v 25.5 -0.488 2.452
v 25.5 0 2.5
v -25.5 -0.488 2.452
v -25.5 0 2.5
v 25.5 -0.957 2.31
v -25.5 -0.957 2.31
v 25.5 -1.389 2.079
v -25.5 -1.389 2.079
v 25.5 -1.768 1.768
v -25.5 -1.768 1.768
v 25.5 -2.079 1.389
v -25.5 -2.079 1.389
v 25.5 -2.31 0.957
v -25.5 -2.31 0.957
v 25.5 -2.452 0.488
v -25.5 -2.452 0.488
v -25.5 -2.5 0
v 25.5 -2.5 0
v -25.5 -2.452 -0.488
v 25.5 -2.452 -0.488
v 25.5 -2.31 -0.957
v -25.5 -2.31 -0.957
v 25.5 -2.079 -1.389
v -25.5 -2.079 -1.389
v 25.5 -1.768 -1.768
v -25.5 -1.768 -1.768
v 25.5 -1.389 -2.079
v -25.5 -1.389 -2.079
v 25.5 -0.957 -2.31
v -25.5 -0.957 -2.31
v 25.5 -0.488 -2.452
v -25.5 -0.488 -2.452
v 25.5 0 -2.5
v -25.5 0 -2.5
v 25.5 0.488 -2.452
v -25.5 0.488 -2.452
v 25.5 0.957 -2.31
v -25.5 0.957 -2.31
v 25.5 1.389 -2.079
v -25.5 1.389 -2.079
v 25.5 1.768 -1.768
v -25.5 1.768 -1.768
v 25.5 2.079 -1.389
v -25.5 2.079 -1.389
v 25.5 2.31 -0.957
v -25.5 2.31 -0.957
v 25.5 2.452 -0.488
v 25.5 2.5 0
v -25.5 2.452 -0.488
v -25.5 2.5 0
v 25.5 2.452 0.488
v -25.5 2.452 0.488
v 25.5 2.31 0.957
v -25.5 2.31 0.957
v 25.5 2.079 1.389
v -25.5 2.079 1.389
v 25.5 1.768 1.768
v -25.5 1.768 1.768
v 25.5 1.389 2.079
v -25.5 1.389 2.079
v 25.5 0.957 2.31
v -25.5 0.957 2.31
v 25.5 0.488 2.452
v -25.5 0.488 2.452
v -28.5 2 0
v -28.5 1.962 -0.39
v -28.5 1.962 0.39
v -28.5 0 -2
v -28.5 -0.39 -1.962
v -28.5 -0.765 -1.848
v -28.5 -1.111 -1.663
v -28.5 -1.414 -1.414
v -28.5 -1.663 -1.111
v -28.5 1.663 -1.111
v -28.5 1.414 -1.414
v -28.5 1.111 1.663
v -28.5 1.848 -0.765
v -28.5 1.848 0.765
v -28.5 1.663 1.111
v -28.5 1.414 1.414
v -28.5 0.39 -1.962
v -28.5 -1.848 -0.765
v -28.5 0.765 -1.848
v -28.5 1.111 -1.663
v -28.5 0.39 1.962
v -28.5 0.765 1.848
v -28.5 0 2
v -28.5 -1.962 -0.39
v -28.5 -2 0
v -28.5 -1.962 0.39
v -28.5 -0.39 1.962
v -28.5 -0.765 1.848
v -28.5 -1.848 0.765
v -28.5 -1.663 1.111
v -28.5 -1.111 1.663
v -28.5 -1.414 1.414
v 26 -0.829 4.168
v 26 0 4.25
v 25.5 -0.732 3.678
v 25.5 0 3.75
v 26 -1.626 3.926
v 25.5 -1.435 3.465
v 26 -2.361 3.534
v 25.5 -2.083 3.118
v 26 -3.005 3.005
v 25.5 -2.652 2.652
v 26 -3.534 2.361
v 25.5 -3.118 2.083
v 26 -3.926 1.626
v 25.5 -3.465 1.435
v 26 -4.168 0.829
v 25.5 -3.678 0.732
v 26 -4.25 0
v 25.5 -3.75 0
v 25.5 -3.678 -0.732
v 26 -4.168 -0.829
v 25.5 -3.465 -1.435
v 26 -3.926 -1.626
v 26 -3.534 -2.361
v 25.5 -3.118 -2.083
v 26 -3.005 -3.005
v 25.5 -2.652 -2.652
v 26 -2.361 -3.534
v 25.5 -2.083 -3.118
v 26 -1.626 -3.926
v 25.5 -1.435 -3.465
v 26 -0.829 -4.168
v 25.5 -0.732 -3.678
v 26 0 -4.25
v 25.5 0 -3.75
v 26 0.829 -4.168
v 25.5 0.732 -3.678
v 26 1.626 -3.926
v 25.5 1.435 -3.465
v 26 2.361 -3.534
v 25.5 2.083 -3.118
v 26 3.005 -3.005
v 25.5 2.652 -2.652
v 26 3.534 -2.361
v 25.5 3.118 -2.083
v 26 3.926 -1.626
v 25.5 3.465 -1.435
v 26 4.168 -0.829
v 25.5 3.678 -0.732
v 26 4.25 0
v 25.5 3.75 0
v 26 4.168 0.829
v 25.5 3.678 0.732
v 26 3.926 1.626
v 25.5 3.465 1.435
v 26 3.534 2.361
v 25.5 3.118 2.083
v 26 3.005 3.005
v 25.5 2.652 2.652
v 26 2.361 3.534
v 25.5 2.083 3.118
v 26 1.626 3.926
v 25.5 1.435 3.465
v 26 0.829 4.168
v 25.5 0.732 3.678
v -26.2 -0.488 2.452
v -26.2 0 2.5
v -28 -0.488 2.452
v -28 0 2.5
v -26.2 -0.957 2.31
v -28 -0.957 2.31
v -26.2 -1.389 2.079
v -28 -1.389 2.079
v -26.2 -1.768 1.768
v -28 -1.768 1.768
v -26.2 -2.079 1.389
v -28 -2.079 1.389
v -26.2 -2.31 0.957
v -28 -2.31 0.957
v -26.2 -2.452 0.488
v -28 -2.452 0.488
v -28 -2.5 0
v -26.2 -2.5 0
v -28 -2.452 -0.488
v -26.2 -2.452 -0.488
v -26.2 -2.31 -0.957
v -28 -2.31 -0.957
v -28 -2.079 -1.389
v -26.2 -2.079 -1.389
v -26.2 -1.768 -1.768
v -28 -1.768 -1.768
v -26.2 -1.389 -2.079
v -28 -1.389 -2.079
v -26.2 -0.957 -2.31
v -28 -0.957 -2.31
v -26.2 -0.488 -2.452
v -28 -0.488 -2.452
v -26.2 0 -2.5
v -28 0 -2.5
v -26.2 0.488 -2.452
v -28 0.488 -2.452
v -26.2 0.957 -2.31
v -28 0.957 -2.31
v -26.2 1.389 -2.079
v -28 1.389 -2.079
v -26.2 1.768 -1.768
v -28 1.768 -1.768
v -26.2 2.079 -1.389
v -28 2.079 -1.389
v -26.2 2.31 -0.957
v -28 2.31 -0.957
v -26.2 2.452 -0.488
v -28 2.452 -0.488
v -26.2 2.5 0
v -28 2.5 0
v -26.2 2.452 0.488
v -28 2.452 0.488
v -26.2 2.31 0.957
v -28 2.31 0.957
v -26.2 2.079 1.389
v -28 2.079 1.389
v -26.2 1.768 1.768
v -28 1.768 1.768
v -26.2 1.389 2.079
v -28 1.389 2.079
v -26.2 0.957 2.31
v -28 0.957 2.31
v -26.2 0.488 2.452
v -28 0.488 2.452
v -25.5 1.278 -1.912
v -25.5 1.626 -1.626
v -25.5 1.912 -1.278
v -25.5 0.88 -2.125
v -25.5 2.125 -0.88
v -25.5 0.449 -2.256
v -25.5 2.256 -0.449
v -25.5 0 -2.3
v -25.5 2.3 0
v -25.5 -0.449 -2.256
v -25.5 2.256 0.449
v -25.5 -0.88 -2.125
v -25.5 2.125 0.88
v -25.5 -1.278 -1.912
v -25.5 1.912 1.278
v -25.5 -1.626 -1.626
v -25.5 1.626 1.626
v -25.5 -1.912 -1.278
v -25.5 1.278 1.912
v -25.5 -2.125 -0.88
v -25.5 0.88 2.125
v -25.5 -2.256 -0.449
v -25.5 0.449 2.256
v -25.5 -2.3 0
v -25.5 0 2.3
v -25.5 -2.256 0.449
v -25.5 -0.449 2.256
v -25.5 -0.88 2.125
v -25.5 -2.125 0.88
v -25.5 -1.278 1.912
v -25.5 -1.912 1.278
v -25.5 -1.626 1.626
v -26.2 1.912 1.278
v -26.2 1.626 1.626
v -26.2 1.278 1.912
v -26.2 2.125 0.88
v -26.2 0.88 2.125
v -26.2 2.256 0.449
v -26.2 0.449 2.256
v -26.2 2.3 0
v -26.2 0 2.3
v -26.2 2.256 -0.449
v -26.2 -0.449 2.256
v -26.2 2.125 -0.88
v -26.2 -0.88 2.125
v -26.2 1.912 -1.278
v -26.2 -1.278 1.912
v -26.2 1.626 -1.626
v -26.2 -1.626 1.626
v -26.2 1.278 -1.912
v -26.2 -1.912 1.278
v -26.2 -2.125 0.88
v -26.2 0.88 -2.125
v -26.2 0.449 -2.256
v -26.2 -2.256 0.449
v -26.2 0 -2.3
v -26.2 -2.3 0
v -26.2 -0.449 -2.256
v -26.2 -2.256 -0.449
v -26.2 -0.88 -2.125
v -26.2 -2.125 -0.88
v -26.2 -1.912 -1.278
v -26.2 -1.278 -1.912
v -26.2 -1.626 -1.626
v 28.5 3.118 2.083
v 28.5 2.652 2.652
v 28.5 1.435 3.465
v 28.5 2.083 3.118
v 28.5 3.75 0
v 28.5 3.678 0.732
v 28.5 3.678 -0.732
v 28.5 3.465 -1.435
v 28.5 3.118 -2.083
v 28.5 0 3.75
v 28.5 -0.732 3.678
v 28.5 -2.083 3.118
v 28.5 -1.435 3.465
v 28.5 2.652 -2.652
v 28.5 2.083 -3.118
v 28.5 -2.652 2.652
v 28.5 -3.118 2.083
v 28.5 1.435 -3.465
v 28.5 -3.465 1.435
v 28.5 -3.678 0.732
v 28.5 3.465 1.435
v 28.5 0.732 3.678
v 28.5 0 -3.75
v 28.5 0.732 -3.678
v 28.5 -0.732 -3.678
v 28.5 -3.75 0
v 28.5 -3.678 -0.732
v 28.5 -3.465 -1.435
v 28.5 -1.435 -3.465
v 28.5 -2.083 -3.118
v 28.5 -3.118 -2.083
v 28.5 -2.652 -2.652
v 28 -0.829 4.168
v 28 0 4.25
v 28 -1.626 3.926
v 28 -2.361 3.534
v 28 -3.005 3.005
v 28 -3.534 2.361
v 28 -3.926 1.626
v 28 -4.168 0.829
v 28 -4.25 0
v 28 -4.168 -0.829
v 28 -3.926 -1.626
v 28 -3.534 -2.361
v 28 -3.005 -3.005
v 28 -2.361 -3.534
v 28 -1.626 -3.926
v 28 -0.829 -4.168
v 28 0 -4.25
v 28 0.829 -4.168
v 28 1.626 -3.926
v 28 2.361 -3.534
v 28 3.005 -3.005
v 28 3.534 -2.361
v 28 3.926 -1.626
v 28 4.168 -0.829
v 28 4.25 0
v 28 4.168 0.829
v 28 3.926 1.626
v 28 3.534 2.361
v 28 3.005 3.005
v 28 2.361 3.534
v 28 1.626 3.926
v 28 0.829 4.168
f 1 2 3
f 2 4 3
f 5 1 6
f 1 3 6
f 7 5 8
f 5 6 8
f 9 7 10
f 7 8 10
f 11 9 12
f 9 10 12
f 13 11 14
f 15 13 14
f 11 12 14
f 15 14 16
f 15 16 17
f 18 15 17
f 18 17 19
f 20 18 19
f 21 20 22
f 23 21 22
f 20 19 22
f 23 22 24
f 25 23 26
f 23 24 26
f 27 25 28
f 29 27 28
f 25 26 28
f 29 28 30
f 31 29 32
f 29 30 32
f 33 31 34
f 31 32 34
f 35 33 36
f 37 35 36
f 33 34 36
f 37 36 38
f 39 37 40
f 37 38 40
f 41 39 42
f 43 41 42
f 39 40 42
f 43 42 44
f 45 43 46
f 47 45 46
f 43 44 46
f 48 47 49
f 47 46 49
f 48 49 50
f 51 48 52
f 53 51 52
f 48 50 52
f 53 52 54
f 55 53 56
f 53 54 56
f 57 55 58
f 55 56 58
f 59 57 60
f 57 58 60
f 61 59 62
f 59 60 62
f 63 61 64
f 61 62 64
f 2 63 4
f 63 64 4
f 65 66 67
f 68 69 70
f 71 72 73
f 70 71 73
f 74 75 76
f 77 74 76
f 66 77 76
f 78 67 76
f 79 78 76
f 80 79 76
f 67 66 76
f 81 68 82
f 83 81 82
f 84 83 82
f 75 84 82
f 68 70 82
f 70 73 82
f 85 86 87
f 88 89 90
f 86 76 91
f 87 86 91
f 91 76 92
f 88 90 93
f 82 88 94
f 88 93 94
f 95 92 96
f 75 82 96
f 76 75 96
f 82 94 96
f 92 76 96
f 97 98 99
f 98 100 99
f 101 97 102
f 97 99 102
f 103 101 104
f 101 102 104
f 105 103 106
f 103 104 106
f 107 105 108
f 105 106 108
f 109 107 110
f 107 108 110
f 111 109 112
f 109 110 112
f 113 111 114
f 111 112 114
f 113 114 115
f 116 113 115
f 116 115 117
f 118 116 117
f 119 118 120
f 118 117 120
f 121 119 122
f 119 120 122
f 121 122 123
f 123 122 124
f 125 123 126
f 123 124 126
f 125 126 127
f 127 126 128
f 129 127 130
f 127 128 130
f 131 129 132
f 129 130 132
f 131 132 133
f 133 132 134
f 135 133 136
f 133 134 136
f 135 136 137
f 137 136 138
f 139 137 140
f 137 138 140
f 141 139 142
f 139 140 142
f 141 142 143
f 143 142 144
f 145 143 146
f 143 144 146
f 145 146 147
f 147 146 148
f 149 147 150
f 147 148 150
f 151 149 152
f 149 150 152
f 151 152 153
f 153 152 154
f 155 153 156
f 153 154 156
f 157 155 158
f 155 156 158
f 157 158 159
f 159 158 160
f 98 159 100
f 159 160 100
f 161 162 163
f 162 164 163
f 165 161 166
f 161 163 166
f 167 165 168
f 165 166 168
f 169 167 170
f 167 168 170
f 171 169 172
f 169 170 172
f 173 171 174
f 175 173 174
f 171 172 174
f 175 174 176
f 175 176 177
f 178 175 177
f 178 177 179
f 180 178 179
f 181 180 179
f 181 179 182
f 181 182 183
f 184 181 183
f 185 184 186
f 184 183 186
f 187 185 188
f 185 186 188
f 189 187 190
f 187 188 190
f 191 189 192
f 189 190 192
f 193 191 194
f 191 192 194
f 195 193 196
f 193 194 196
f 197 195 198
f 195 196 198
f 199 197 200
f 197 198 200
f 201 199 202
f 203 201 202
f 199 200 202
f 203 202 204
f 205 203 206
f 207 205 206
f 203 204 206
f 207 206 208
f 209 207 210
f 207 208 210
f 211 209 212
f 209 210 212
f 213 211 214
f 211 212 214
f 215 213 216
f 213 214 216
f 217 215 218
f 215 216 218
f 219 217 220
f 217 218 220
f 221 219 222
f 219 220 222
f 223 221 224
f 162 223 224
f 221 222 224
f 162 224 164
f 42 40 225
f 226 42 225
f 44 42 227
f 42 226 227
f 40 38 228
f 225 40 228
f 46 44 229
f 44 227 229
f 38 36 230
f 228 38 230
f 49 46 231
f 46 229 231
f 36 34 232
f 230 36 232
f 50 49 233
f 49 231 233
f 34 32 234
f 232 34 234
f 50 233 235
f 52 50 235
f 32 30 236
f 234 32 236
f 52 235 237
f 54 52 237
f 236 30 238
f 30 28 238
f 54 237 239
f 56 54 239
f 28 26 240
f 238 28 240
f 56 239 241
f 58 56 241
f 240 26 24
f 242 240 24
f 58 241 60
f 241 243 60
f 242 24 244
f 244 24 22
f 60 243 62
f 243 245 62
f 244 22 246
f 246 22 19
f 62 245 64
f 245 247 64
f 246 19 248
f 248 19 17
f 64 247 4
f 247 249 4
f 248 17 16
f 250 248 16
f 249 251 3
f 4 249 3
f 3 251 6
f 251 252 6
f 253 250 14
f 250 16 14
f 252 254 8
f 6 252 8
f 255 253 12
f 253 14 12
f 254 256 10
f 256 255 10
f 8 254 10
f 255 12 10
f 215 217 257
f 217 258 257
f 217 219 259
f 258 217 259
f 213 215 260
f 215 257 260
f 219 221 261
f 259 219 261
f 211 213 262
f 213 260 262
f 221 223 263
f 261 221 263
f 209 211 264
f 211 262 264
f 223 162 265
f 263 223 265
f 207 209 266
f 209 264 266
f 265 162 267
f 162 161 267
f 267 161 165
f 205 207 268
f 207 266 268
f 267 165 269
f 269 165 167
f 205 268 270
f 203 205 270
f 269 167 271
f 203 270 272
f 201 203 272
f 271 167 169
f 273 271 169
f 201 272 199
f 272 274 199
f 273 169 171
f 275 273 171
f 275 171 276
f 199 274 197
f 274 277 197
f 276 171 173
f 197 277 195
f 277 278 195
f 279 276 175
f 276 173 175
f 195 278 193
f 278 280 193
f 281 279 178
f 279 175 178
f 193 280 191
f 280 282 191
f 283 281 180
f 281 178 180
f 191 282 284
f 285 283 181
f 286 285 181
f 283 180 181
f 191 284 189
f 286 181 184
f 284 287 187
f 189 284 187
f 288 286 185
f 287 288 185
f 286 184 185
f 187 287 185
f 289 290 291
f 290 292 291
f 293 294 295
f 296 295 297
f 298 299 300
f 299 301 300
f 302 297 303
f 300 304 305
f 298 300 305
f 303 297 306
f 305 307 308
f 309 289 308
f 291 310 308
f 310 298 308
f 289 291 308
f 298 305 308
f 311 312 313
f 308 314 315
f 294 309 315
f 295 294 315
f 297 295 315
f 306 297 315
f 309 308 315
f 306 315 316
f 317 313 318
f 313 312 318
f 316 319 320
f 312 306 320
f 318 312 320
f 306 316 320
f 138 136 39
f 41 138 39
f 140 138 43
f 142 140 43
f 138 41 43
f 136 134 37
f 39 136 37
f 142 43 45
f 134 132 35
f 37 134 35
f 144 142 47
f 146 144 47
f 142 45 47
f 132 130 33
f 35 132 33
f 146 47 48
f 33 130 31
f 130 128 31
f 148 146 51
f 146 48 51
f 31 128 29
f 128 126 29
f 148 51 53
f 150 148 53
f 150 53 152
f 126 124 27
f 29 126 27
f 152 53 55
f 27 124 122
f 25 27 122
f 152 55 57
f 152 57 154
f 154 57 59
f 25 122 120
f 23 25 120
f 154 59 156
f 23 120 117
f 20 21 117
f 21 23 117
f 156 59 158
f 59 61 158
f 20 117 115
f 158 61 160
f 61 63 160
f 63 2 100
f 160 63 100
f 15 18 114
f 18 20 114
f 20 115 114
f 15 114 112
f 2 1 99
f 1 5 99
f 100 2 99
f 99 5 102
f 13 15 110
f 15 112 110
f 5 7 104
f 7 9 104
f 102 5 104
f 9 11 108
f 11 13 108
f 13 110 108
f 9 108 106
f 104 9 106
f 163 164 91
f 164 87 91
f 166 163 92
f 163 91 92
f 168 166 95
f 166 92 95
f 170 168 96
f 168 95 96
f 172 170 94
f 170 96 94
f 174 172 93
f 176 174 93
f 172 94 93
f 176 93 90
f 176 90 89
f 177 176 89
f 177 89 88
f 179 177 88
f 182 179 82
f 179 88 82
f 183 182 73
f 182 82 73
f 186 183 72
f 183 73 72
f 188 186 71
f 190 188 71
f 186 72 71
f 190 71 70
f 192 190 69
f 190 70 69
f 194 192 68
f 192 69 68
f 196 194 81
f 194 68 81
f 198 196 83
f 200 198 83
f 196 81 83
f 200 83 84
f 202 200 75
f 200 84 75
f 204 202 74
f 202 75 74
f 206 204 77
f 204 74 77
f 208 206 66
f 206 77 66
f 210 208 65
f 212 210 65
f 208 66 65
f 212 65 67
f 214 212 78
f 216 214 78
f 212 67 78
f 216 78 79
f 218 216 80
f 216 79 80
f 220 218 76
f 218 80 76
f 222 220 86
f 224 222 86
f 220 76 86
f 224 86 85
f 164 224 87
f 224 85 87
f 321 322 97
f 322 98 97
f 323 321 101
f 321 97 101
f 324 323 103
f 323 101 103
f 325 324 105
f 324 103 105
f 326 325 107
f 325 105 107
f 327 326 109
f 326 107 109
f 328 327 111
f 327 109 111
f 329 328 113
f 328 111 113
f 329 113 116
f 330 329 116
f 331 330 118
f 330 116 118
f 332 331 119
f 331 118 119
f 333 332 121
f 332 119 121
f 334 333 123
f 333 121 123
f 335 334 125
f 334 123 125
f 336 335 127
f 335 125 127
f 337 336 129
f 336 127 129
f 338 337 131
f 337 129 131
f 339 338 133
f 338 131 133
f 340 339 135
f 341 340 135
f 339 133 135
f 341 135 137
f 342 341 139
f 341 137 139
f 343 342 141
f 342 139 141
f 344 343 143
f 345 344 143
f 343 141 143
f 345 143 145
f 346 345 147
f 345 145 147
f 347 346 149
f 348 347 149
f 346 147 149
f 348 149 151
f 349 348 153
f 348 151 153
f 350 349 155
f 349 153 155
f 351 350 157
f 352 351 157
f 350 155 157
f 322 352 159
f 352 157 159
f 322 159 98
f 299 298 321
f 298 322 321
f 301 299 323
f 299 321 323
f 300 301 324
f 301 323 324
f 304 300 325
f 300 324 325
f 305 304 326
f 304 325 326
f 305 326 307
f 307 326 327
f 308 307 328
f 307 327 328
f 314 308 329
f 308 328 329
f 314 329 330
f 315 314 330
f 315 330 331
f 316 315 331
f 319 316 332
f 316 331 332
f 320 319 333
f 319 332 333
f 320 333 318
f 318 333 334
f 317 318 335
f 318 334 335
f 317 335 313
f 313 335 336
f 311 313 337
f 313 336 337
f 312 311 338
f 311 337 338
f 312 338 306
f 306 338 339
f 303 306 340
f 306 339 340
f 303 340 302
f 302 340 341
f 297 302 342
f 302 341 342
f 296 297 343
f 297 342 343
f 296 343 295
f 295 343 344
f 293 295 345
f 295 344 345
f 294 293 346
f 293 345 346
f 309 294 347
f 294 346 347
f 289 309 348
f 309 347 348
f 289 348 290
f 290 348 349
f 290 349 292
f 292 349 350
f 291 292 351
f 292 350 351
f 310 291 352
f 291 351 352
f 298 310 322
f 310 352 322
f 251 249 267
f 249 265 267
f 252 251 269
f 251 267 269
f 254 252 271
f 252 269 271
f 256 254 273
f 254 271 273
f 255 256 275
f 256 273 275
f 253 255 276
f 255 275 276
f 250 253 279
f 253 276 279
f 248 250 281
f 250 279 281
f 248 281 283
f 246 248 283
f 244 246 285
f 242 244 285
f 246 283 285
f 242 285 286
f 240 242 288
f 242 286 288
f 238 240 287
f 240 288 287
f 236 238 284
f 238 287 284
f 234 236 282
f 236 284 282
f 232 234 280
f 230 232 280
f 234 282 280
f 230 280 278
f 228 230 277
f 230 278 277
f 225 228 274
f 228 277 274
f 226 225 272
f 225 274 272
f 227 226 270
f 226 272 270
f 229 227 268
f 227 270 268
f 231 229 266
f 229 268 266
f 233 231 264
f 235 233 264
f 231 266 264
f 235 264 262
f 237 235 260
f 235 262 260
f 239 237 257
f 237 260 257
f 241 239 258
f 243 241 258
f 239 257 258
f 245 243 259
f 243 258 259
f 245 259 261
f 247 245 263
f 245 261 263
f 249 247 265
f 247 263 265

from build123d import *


with BuildPart() as part:
    # Sketch1 → Revolve1 (revolve)
    with BuildSketch(Plane(origin=(0, 0, 0), x_dir=(1, 0, 0), z_dir=(0, 1, 0)), mode=Mode.PRIVATE) as revolve1_sk:
        Polygon((-28.5, 0), (28.5, 0), (28.5, 3.75), (28, 4.25), (26, 4.25), (25.5, 3.75), (25.5, 2.5), (-25.5, 2.5), (-25.5, 2.3), (-26.2, 2.3), (-26.2, 2.5), (-28, 2.5), (-28.5, 2), align=None)
    revolve(revolve1_sk.sketch.rotate(Axis((-28.5, 0, 0), (1, 0, 0)), 180), axis=Axis((-28.5, 0, 0), (1, 0, 0)))


solid = part.part
